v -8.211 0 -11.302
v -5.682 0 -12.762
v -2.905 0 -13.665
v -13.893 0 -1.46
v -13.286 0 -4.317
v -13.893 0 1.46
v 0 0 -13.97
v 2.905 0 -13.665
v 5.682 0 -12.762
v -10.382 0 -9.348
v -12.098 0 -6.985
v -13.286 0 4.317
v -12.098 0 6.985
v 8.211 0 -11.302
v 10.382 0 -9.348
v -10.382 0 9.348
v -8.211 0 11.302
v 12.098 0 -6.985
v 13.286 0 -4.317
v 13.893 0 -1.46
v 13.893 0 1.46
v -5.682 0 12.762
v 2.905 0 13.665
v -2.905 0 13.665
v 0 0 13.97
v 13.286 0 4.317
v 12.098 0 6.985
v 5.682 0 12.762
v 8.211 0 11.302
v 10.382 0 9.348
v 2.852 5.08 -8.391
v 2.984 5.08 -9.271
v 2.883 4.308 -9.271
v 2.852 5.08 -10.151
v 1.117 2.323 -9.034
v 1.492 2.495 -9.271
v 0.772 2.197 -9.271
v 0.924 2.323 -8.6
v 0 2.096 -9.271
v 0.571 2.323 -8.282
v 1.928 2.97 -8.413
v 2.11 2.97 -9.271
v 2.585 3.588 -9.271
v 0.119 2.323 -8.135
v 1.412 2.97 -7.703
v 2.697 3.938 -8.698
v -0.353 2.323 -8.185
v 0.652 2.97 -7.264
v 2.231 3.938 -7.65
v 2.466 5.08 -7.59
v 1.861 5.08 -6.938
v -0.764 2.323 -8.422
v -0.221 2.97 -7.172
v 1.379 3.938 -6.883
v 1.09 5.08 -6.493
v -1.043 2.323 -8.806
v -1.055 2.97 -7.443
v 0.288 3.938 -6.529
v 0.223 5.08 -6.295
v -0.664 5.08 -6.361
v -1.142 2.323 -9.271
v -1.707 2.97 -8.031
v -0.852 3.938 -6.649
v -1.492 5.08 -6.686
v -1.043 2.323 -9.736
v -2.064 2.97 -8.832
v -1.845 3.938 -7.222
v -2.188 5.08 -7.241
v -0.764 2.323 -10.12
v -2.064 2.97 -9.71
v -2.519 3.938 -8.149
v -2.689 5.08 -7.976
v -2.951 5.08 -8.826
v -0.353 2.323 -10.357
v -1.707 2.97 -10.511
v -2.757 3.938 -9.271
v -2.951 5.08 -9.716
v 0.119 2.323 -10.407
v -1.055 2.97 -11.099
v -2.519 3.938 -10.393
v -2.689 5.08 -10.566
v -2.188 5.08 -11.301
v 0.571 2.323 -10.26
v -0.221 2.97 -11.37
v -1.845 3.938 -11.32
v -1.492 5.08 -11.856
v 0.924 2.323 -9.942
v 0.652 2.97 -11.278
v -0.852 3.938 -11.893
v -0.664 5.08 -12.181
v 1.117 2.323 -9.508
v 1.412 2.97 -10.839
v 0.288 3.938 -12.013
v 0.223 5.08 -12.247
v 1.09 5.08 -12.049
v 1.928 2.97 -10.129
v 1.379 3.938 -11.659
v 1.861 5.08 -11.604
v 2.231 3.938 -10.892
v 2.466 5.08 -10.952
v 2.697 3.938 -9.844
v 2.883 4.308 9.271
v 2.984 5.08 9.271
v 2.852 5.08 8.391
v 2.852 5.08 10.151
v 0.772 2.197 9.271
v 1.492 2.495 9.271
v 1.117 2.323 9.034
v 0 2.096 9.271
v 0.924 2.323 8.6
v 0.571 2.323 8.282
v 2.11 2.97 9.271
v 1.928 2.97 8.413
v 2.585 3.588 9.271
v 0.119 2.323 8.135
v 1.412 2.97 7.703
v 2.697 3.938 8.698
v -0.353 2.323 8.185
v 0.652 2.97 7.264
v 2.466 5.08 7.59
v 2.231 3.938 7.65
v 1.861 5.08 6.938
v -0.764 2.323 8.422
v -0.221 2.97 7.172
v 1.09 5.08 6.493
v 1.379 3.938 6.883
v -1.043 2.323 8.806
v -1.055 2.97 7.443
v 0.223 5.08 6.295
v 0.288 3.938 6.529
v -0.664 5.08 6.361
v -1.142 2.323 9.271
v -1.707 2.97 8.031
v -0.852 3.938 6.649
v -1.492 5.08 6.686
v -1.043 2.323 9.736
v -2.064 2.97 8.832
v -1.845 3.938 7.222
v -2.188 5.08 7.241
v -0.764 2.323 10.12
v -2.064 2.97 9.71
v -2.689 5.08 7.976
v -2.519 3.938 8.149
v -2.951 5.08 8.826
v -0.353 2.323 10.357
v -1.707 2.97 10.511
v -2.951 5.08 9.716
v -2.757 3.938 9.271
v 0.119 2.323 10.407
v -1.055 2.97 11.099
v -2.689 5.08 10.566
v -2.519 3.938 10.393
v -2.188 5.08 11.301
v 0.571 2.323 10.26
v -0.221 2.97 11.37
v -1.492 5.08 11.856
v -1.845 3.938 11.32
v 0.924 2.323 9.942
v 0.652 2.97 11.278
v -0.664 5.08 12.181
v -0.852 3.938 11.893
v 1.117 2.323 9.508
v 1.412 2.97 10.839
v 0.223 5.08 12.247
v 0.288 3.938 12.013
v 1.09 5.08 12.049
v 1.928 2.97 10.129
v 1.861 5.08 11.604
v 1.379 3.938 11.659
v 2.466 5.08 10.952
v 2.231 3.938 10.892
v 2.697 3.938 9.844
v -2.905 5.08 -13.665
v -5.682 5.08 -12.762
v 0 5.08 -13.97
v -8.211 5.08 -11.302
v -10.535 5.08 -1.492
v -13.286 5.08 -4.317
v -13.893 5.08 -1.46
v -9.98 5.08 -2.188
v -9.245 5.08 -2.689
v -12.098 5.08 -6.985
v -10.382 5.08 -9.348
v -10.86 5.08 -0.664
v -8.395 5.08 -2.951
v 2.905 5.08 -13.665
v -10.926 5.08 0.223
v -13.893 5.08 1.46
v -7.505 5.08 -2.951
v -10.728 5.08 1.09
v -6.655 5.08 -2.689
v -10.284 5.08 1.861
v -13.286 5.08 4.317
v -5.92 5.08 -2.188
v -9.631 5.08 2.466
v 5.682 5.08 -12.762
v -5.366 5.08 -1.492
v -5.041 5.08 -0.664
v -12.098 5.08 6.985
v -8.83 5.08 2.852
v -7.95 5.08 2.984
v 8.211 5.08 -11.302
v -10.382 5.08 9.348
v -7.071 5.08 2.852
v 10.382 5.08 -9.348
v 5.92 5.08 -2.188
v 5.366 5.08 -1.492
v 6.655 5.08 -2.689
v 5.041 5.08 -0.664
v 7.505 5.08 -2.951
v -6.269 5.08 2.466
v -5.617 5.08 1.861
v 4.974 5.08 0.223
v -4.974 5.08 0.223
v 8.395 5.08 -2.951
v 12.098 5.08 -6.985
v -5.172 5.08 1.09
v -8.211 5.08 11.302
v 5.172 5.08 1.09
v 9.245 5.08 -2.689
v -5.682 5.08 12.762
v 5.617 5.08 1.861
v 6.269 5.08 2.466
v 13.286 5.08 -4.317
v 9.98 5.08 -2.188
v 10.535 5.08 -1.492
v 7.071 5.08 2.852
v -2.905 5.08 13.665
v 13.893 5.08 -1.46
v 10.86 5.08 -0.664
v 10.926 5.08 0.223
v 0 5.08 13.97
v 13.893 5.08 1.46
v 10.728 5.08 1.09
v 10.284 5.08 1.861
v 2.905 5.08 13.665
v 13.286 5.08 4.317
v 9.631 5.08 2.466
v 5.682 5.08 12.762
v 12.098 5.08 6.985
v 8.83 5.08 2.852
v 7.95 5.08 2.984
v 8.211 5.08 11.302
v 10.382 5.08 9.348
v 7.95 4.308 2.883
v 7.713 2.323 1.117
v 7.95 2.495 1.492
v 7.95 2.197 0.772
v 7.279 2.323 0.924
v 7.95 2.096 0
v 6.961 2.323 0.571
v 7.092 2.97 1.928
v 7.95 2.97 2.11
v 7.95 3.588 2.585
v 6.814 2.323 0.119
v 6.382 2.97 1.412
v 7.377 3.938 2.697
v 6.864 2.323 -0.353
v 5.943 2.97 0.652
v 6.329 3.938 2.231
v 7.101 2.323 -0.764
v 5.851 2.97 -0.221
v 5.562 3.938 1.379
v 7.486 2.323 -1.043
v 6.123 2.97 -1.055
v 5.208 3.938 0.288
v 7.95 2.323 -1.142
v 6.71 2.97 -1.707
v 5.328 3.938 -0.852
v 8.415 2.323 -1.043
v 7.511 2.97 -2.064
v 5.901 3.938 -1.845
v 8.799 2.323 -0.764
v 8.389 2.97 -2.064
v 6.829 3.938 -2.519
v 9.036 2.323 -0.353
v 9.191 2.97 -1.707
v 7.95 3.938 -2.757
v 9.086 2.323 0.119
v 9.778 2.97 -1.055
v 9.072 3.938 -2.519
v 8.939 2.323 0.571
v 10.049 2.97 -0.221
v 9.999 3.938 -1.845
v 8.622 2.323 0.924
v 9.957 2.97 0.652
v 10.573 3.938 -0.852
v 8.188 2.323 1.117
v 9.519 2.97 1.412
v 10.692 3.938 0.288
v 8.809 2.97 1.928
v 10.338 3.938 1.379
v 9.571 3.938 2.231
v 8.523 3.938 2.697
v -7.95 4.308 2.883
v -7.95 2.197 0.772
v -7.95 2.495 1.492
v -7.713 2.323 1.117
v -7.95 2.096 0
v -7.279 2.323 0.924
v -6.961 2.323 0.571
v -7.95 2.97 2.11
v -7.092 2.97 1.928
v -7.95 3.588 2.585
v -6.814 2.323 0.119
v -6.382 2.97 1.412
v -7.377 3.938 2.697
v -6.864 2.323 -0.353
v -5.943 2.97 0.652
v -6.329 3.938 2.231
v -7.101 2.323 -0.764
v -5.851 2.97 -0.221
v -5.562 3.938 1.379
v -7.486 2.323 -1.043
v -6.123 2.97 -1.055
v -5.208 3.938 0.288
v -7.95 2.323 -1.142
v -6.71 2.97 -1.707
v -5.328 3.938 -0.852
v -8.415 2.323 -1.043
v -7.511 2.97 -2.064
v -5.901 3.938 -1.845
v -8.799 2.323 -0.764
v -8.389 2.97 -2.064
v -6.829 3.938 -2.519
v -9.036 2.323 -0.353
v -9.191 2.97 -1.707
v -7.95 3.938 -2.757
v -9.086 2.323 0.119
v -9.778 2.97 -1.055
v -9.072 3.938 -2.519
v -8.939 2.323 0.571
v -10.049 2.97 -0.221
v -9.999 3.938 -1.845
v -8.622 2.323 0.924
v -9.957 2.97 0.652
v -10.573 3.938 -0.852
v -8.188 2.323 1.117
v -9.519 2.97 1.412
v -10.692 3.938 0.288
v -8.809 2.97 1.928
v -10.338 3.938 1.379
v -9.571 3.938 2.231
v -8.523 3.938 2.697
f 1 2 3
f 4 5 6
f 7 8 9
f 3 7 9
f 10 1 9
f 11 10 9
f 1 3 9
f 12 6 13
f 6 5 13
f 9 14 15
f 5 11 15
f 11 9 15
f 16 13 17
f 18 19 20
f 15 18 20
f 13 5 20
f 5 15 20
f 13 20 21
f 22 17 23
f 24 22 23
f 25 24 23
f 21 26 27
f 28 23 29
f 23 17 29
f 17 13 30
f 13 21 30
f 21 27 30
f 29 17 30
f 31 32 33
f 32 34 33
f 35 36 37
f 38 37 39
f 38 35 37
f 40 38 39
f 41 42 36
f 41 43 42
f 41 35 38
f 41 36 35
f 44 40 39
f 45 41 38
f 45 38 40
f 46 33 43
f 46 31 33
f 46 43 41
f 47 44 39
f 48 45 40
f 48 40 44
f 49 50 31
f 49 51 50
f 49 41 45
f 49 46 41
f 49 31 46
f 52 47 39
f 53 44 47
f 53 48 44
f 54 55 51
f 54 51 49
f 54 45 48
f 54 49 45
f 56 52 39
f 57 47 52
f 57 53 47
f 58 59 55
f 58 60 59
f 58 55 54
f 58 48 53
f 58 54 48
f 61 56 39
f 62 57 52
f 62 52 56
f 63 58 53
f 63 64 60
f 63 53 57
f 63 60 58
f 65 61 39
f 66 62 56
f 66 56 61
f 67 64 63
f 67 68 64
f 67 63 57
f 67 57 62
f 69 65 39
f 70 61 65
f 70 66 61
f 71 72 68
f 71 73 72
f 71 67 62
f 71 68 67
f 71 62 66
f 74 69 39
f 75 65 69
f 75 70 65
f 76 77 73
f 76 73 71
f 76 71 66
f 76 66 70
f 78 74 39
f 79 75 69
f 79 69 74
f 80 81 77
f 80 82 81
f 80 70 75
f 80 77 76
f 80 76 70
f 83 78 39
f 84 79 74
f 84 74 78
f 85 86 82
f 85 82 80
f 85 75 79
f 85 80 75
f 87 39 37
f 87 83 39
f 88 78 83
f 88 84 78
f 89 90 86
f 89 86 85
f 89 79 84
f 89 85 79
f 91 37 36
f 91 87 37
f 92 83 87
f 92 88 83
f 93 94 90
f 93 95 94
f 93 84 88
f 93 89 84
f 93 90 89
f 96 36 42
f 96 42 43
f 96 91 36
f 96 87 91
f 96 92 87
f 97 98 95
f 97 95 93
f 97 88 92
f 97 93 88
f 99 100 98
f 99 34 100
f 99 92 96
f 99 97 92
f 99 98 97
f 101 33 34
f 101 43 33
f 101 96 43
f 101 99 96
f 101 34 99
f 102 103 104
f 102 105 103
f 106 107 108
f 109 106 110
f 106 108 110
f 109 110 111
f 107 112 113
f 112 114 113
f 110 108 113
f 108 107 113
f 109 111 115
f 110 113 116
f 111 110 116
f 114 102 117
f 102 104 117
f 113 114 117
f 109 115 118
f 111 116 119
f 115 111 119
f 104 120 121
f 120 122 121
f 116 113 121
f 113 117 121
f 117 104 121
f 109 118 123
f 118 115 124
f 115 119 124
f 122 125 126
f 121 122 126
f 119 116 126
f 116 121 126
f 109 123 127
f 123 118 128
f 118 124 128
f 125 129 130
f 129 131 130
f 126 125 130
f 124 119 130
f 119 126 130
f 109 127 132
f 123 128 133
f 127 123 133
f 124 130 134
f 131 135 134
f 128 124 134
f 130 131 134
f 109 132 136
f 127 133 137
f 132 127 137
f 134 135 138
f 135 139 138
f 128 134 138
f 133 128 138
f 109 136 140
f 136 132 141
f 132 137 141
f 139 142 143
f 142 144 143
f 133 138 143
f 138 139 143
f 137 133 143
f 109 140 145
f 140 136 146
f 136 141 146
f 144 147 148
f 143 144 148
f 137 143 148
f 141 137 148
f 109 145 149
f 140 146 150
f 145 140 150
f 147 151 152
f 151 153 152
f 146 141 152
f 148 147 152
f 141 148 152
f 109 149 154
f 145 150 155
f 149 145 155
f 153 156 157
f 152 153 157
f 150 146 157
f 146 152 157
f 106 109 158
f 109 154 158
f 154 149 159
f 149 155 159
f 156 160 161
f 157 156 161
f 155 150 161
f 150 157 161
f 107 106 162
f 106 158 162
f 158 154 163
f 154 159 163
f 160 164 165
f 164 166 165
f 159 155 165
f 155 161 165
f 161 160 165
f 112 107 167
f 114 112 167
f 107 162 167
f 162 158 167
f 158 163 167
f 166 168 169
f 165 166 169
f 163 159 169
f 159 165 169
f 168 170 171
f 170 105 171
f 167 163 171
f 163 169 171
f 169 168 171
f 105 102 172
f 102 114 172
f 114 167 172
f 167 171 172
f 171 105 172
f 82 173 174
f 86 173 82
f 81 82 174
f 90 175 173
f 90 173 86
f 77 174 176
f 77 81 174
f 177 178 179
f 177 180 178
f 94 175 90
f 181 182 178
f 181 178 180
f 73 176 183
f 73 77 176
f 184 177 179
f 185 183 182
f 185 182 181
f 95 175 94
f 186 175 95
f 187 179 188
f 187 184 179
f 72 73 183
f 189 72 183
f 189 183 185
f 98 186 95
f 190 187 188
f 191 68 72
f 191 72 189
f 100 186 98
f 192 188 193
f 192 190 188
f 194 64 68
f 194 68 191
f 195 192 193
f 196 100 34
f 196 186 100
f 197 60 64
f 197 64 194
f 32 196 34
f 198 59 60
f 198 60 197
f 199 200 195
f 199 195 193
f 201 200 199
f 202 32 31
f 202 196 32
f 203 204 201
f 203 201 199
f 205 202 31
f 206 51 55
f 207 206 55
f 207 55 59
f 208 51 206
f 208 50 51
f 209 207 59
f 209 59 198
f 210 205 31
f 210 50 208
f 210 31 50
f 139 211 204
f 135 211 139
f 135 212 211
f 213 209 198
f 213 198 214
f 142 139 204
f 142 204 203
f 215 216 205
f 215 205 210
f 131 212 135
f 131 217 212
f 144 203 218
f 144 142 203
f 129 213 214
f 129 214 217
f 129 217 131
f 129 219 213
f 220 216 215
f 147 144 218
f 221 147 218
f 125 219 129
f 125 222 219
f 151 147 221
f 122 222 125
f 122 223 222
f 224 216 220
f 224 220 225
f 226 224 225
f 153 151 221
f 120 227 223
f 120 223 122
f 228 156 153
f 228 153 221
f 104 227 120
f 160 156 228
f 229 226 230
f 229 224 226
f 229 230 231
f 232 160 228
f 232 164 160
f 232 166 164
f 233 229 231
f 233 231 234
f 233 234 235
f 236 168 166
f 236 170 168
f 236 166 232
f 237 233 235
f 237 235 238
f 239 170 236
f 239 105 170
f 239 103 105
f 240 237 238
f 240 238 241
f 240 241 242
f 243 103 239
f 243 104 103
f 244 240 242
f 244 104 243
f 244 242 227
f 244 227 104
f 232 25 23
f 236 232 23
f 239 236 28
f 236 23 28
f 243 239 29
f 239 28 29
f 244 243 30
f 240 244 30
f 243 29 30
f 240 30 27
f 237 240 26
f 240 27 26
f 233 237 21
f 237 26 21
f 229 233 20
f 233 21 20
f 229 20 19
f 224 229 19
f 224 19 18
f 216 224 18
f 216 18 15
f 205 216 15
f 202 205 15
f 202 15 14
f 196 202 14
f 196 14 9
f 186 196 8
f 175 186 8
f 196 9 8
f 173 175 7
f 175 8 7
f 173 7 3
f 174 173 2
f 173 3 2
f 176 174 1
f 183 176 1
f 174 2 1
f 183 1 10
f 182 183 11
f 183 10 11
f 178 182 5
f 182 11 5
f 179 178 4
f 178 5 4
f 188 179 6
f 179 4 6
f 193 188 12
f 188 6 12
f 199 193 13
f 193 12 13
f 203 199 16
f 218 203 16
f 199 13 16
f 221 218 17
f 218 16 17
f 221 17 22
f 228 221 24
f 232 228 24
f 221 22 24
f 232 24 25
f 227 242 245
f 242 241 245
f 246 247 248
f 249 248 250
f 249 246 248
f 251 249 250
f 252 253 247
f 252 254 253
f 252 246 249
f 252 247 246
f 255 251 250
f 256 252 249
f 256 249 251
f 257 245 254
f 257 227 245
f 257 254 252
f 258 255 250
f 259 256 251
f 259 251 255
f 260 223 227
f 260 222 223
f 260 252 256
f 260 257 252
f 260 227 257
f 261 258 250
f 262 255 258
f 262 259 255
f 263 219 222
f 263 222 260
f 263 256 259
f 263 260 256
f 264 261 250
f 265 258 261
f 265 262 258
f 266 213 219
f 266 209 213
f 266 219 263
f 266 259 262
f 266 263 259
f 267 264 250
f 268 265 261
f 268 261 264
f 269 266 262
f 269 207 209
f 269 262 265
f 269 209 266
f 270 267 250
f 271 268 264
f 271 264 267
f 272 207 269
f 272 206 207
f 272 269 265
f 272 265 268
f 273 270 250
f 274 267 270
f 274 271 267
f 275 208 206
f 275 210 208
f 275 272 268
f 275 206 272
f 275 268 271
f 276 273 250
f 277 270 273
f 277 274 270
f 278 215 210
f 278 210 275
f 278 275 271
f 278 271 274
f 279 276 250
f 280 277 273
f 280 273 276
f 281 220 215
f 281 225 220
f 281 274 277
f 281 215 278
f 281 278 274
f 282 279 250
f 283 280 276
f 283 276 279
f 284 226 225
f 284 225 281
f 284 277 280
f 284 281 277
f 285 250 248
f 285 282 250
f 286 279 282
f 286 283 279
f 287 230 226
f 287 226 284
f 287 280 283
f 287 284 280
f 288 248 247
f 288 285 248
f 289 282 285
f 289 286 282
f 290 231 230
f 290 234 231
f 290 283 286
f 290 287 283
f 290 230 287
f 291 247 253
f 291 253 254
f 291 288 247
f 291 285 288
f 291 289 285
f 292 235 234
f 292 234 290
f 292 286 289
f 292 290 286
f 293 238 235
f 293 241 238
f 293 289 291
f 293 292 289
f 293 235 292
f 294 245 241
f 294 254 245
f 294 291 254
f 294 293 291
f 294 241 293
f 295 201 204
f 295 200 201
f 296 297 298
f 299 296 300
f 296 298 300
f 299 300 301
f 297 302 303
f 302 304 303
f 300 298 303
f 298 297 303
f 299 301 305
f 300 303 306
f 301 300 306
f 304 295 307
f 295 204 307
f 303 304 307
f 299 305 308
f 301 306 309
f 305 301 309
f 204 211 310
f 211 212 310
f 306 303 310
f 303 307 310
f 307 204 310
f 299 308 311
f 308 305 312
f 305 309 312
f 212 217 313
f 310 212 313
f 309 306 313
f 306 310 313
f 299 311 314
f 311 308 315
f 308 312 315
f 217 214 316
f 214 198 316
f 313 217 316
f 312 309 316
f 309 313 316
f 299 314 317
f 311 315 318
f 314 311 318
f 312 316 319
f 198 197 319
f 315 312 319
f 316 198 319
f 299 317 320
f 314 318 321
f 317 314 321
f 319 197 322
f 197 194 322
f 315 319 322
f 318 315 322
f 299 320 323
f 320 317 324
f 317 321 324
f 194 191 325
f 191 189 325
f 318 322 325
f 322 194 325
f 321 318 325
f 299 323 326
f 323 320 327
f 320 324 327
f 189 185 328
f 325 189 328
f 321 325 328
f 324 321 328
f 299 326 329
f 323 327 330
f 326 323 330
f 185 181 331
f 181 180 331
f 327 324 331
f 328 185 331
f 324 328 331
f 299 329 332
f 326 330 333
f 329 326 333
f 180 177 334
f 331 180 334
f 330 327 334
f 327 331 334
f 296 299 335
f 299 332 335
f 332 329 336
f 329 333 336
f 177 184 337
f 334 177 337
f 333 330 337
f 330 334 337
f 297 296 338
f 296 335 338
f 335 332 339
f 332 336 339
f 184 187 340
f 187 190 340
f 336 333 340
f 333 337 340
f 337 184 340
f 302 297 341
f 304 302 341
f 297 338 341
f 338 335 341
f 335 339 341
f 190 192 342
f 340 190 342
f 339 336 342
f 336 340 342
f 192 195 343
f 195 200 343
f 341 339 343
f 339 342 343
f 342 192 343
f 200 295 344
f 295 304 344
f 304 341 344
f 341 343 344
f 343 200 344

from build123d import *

# Parameters (mm, degrees)
SKETCH1_R           = 13.97
BOSS_EXTRUDE1_DEPTH = 5.08


with BuildPart() as part:
    # Sketch1 → Boss-Extrude1 (new body)
    with BuildSketch(Plane(origin=(0, 0, 0), x_dir=(1, 0, 0), z_dir=(0, 1, 0))):
        with Locations(Location((0, 0, 0), (0, 0, 270))):
            Circle(SKETCH1_R)
    extrude(amount=BOSS_EXTRUDE1_DEPTH)

    # Sketch5 → Cut-Revolve3 (revolve, cut)
    with BuildSketch(Plane(origin=(7.9502, 0, 0), x_dir=(0, 0, -1), z_dir=(1, 0, 0))):
        with BuildLine():
            Line((0, 5.08), (0, 2.0955))
            ThreePointArc((0, 2.0955), (-2.110360188, 2.969639812), (-2.9845, 5.08))
            Line((-2.9845, 5.08), (0, 5.08))
        make_face()
    cut_revolve3 = revolve(axis=Axis((7.9502, 5.08, 0), (0, -1, 0)), mode=Mode.SUBTRACT)

    # Mirror3: Cut-Revolve3 across plane
    add(cut_revolve3.mirror(Plane(origin=(0, 0, 0), x_dir=(0, 0, 1), z_dir=(1, 0, 0))), mode=Mode.SUBTRACT)

    # Sketch3 → Cut-Revolve4 (revolve, cut)
    with BuildSketch(Plane.XY.offset(-9.271)):
        with BuildLine():
            Line((0, 5.08), (0, 2.0955))
            ThreePointArc((0, 2.0955), (2.110360188, 2.969639812), (2.9845, 5.08))
            Line((2.9845, 5.08), (0, 5.08))
        make_face()
    cut_revolve4 = revolve(axis=Axis((0, 5.08, -9.271), (0, -1, 0)), mode=Mode.SUBTRACT)

    # Mirror4: Cut-Revolve4 across plane
    add(cut_revolve4.mirror(Plane.XY), mode=Mode.SUBTRACT)


solid = part.part
